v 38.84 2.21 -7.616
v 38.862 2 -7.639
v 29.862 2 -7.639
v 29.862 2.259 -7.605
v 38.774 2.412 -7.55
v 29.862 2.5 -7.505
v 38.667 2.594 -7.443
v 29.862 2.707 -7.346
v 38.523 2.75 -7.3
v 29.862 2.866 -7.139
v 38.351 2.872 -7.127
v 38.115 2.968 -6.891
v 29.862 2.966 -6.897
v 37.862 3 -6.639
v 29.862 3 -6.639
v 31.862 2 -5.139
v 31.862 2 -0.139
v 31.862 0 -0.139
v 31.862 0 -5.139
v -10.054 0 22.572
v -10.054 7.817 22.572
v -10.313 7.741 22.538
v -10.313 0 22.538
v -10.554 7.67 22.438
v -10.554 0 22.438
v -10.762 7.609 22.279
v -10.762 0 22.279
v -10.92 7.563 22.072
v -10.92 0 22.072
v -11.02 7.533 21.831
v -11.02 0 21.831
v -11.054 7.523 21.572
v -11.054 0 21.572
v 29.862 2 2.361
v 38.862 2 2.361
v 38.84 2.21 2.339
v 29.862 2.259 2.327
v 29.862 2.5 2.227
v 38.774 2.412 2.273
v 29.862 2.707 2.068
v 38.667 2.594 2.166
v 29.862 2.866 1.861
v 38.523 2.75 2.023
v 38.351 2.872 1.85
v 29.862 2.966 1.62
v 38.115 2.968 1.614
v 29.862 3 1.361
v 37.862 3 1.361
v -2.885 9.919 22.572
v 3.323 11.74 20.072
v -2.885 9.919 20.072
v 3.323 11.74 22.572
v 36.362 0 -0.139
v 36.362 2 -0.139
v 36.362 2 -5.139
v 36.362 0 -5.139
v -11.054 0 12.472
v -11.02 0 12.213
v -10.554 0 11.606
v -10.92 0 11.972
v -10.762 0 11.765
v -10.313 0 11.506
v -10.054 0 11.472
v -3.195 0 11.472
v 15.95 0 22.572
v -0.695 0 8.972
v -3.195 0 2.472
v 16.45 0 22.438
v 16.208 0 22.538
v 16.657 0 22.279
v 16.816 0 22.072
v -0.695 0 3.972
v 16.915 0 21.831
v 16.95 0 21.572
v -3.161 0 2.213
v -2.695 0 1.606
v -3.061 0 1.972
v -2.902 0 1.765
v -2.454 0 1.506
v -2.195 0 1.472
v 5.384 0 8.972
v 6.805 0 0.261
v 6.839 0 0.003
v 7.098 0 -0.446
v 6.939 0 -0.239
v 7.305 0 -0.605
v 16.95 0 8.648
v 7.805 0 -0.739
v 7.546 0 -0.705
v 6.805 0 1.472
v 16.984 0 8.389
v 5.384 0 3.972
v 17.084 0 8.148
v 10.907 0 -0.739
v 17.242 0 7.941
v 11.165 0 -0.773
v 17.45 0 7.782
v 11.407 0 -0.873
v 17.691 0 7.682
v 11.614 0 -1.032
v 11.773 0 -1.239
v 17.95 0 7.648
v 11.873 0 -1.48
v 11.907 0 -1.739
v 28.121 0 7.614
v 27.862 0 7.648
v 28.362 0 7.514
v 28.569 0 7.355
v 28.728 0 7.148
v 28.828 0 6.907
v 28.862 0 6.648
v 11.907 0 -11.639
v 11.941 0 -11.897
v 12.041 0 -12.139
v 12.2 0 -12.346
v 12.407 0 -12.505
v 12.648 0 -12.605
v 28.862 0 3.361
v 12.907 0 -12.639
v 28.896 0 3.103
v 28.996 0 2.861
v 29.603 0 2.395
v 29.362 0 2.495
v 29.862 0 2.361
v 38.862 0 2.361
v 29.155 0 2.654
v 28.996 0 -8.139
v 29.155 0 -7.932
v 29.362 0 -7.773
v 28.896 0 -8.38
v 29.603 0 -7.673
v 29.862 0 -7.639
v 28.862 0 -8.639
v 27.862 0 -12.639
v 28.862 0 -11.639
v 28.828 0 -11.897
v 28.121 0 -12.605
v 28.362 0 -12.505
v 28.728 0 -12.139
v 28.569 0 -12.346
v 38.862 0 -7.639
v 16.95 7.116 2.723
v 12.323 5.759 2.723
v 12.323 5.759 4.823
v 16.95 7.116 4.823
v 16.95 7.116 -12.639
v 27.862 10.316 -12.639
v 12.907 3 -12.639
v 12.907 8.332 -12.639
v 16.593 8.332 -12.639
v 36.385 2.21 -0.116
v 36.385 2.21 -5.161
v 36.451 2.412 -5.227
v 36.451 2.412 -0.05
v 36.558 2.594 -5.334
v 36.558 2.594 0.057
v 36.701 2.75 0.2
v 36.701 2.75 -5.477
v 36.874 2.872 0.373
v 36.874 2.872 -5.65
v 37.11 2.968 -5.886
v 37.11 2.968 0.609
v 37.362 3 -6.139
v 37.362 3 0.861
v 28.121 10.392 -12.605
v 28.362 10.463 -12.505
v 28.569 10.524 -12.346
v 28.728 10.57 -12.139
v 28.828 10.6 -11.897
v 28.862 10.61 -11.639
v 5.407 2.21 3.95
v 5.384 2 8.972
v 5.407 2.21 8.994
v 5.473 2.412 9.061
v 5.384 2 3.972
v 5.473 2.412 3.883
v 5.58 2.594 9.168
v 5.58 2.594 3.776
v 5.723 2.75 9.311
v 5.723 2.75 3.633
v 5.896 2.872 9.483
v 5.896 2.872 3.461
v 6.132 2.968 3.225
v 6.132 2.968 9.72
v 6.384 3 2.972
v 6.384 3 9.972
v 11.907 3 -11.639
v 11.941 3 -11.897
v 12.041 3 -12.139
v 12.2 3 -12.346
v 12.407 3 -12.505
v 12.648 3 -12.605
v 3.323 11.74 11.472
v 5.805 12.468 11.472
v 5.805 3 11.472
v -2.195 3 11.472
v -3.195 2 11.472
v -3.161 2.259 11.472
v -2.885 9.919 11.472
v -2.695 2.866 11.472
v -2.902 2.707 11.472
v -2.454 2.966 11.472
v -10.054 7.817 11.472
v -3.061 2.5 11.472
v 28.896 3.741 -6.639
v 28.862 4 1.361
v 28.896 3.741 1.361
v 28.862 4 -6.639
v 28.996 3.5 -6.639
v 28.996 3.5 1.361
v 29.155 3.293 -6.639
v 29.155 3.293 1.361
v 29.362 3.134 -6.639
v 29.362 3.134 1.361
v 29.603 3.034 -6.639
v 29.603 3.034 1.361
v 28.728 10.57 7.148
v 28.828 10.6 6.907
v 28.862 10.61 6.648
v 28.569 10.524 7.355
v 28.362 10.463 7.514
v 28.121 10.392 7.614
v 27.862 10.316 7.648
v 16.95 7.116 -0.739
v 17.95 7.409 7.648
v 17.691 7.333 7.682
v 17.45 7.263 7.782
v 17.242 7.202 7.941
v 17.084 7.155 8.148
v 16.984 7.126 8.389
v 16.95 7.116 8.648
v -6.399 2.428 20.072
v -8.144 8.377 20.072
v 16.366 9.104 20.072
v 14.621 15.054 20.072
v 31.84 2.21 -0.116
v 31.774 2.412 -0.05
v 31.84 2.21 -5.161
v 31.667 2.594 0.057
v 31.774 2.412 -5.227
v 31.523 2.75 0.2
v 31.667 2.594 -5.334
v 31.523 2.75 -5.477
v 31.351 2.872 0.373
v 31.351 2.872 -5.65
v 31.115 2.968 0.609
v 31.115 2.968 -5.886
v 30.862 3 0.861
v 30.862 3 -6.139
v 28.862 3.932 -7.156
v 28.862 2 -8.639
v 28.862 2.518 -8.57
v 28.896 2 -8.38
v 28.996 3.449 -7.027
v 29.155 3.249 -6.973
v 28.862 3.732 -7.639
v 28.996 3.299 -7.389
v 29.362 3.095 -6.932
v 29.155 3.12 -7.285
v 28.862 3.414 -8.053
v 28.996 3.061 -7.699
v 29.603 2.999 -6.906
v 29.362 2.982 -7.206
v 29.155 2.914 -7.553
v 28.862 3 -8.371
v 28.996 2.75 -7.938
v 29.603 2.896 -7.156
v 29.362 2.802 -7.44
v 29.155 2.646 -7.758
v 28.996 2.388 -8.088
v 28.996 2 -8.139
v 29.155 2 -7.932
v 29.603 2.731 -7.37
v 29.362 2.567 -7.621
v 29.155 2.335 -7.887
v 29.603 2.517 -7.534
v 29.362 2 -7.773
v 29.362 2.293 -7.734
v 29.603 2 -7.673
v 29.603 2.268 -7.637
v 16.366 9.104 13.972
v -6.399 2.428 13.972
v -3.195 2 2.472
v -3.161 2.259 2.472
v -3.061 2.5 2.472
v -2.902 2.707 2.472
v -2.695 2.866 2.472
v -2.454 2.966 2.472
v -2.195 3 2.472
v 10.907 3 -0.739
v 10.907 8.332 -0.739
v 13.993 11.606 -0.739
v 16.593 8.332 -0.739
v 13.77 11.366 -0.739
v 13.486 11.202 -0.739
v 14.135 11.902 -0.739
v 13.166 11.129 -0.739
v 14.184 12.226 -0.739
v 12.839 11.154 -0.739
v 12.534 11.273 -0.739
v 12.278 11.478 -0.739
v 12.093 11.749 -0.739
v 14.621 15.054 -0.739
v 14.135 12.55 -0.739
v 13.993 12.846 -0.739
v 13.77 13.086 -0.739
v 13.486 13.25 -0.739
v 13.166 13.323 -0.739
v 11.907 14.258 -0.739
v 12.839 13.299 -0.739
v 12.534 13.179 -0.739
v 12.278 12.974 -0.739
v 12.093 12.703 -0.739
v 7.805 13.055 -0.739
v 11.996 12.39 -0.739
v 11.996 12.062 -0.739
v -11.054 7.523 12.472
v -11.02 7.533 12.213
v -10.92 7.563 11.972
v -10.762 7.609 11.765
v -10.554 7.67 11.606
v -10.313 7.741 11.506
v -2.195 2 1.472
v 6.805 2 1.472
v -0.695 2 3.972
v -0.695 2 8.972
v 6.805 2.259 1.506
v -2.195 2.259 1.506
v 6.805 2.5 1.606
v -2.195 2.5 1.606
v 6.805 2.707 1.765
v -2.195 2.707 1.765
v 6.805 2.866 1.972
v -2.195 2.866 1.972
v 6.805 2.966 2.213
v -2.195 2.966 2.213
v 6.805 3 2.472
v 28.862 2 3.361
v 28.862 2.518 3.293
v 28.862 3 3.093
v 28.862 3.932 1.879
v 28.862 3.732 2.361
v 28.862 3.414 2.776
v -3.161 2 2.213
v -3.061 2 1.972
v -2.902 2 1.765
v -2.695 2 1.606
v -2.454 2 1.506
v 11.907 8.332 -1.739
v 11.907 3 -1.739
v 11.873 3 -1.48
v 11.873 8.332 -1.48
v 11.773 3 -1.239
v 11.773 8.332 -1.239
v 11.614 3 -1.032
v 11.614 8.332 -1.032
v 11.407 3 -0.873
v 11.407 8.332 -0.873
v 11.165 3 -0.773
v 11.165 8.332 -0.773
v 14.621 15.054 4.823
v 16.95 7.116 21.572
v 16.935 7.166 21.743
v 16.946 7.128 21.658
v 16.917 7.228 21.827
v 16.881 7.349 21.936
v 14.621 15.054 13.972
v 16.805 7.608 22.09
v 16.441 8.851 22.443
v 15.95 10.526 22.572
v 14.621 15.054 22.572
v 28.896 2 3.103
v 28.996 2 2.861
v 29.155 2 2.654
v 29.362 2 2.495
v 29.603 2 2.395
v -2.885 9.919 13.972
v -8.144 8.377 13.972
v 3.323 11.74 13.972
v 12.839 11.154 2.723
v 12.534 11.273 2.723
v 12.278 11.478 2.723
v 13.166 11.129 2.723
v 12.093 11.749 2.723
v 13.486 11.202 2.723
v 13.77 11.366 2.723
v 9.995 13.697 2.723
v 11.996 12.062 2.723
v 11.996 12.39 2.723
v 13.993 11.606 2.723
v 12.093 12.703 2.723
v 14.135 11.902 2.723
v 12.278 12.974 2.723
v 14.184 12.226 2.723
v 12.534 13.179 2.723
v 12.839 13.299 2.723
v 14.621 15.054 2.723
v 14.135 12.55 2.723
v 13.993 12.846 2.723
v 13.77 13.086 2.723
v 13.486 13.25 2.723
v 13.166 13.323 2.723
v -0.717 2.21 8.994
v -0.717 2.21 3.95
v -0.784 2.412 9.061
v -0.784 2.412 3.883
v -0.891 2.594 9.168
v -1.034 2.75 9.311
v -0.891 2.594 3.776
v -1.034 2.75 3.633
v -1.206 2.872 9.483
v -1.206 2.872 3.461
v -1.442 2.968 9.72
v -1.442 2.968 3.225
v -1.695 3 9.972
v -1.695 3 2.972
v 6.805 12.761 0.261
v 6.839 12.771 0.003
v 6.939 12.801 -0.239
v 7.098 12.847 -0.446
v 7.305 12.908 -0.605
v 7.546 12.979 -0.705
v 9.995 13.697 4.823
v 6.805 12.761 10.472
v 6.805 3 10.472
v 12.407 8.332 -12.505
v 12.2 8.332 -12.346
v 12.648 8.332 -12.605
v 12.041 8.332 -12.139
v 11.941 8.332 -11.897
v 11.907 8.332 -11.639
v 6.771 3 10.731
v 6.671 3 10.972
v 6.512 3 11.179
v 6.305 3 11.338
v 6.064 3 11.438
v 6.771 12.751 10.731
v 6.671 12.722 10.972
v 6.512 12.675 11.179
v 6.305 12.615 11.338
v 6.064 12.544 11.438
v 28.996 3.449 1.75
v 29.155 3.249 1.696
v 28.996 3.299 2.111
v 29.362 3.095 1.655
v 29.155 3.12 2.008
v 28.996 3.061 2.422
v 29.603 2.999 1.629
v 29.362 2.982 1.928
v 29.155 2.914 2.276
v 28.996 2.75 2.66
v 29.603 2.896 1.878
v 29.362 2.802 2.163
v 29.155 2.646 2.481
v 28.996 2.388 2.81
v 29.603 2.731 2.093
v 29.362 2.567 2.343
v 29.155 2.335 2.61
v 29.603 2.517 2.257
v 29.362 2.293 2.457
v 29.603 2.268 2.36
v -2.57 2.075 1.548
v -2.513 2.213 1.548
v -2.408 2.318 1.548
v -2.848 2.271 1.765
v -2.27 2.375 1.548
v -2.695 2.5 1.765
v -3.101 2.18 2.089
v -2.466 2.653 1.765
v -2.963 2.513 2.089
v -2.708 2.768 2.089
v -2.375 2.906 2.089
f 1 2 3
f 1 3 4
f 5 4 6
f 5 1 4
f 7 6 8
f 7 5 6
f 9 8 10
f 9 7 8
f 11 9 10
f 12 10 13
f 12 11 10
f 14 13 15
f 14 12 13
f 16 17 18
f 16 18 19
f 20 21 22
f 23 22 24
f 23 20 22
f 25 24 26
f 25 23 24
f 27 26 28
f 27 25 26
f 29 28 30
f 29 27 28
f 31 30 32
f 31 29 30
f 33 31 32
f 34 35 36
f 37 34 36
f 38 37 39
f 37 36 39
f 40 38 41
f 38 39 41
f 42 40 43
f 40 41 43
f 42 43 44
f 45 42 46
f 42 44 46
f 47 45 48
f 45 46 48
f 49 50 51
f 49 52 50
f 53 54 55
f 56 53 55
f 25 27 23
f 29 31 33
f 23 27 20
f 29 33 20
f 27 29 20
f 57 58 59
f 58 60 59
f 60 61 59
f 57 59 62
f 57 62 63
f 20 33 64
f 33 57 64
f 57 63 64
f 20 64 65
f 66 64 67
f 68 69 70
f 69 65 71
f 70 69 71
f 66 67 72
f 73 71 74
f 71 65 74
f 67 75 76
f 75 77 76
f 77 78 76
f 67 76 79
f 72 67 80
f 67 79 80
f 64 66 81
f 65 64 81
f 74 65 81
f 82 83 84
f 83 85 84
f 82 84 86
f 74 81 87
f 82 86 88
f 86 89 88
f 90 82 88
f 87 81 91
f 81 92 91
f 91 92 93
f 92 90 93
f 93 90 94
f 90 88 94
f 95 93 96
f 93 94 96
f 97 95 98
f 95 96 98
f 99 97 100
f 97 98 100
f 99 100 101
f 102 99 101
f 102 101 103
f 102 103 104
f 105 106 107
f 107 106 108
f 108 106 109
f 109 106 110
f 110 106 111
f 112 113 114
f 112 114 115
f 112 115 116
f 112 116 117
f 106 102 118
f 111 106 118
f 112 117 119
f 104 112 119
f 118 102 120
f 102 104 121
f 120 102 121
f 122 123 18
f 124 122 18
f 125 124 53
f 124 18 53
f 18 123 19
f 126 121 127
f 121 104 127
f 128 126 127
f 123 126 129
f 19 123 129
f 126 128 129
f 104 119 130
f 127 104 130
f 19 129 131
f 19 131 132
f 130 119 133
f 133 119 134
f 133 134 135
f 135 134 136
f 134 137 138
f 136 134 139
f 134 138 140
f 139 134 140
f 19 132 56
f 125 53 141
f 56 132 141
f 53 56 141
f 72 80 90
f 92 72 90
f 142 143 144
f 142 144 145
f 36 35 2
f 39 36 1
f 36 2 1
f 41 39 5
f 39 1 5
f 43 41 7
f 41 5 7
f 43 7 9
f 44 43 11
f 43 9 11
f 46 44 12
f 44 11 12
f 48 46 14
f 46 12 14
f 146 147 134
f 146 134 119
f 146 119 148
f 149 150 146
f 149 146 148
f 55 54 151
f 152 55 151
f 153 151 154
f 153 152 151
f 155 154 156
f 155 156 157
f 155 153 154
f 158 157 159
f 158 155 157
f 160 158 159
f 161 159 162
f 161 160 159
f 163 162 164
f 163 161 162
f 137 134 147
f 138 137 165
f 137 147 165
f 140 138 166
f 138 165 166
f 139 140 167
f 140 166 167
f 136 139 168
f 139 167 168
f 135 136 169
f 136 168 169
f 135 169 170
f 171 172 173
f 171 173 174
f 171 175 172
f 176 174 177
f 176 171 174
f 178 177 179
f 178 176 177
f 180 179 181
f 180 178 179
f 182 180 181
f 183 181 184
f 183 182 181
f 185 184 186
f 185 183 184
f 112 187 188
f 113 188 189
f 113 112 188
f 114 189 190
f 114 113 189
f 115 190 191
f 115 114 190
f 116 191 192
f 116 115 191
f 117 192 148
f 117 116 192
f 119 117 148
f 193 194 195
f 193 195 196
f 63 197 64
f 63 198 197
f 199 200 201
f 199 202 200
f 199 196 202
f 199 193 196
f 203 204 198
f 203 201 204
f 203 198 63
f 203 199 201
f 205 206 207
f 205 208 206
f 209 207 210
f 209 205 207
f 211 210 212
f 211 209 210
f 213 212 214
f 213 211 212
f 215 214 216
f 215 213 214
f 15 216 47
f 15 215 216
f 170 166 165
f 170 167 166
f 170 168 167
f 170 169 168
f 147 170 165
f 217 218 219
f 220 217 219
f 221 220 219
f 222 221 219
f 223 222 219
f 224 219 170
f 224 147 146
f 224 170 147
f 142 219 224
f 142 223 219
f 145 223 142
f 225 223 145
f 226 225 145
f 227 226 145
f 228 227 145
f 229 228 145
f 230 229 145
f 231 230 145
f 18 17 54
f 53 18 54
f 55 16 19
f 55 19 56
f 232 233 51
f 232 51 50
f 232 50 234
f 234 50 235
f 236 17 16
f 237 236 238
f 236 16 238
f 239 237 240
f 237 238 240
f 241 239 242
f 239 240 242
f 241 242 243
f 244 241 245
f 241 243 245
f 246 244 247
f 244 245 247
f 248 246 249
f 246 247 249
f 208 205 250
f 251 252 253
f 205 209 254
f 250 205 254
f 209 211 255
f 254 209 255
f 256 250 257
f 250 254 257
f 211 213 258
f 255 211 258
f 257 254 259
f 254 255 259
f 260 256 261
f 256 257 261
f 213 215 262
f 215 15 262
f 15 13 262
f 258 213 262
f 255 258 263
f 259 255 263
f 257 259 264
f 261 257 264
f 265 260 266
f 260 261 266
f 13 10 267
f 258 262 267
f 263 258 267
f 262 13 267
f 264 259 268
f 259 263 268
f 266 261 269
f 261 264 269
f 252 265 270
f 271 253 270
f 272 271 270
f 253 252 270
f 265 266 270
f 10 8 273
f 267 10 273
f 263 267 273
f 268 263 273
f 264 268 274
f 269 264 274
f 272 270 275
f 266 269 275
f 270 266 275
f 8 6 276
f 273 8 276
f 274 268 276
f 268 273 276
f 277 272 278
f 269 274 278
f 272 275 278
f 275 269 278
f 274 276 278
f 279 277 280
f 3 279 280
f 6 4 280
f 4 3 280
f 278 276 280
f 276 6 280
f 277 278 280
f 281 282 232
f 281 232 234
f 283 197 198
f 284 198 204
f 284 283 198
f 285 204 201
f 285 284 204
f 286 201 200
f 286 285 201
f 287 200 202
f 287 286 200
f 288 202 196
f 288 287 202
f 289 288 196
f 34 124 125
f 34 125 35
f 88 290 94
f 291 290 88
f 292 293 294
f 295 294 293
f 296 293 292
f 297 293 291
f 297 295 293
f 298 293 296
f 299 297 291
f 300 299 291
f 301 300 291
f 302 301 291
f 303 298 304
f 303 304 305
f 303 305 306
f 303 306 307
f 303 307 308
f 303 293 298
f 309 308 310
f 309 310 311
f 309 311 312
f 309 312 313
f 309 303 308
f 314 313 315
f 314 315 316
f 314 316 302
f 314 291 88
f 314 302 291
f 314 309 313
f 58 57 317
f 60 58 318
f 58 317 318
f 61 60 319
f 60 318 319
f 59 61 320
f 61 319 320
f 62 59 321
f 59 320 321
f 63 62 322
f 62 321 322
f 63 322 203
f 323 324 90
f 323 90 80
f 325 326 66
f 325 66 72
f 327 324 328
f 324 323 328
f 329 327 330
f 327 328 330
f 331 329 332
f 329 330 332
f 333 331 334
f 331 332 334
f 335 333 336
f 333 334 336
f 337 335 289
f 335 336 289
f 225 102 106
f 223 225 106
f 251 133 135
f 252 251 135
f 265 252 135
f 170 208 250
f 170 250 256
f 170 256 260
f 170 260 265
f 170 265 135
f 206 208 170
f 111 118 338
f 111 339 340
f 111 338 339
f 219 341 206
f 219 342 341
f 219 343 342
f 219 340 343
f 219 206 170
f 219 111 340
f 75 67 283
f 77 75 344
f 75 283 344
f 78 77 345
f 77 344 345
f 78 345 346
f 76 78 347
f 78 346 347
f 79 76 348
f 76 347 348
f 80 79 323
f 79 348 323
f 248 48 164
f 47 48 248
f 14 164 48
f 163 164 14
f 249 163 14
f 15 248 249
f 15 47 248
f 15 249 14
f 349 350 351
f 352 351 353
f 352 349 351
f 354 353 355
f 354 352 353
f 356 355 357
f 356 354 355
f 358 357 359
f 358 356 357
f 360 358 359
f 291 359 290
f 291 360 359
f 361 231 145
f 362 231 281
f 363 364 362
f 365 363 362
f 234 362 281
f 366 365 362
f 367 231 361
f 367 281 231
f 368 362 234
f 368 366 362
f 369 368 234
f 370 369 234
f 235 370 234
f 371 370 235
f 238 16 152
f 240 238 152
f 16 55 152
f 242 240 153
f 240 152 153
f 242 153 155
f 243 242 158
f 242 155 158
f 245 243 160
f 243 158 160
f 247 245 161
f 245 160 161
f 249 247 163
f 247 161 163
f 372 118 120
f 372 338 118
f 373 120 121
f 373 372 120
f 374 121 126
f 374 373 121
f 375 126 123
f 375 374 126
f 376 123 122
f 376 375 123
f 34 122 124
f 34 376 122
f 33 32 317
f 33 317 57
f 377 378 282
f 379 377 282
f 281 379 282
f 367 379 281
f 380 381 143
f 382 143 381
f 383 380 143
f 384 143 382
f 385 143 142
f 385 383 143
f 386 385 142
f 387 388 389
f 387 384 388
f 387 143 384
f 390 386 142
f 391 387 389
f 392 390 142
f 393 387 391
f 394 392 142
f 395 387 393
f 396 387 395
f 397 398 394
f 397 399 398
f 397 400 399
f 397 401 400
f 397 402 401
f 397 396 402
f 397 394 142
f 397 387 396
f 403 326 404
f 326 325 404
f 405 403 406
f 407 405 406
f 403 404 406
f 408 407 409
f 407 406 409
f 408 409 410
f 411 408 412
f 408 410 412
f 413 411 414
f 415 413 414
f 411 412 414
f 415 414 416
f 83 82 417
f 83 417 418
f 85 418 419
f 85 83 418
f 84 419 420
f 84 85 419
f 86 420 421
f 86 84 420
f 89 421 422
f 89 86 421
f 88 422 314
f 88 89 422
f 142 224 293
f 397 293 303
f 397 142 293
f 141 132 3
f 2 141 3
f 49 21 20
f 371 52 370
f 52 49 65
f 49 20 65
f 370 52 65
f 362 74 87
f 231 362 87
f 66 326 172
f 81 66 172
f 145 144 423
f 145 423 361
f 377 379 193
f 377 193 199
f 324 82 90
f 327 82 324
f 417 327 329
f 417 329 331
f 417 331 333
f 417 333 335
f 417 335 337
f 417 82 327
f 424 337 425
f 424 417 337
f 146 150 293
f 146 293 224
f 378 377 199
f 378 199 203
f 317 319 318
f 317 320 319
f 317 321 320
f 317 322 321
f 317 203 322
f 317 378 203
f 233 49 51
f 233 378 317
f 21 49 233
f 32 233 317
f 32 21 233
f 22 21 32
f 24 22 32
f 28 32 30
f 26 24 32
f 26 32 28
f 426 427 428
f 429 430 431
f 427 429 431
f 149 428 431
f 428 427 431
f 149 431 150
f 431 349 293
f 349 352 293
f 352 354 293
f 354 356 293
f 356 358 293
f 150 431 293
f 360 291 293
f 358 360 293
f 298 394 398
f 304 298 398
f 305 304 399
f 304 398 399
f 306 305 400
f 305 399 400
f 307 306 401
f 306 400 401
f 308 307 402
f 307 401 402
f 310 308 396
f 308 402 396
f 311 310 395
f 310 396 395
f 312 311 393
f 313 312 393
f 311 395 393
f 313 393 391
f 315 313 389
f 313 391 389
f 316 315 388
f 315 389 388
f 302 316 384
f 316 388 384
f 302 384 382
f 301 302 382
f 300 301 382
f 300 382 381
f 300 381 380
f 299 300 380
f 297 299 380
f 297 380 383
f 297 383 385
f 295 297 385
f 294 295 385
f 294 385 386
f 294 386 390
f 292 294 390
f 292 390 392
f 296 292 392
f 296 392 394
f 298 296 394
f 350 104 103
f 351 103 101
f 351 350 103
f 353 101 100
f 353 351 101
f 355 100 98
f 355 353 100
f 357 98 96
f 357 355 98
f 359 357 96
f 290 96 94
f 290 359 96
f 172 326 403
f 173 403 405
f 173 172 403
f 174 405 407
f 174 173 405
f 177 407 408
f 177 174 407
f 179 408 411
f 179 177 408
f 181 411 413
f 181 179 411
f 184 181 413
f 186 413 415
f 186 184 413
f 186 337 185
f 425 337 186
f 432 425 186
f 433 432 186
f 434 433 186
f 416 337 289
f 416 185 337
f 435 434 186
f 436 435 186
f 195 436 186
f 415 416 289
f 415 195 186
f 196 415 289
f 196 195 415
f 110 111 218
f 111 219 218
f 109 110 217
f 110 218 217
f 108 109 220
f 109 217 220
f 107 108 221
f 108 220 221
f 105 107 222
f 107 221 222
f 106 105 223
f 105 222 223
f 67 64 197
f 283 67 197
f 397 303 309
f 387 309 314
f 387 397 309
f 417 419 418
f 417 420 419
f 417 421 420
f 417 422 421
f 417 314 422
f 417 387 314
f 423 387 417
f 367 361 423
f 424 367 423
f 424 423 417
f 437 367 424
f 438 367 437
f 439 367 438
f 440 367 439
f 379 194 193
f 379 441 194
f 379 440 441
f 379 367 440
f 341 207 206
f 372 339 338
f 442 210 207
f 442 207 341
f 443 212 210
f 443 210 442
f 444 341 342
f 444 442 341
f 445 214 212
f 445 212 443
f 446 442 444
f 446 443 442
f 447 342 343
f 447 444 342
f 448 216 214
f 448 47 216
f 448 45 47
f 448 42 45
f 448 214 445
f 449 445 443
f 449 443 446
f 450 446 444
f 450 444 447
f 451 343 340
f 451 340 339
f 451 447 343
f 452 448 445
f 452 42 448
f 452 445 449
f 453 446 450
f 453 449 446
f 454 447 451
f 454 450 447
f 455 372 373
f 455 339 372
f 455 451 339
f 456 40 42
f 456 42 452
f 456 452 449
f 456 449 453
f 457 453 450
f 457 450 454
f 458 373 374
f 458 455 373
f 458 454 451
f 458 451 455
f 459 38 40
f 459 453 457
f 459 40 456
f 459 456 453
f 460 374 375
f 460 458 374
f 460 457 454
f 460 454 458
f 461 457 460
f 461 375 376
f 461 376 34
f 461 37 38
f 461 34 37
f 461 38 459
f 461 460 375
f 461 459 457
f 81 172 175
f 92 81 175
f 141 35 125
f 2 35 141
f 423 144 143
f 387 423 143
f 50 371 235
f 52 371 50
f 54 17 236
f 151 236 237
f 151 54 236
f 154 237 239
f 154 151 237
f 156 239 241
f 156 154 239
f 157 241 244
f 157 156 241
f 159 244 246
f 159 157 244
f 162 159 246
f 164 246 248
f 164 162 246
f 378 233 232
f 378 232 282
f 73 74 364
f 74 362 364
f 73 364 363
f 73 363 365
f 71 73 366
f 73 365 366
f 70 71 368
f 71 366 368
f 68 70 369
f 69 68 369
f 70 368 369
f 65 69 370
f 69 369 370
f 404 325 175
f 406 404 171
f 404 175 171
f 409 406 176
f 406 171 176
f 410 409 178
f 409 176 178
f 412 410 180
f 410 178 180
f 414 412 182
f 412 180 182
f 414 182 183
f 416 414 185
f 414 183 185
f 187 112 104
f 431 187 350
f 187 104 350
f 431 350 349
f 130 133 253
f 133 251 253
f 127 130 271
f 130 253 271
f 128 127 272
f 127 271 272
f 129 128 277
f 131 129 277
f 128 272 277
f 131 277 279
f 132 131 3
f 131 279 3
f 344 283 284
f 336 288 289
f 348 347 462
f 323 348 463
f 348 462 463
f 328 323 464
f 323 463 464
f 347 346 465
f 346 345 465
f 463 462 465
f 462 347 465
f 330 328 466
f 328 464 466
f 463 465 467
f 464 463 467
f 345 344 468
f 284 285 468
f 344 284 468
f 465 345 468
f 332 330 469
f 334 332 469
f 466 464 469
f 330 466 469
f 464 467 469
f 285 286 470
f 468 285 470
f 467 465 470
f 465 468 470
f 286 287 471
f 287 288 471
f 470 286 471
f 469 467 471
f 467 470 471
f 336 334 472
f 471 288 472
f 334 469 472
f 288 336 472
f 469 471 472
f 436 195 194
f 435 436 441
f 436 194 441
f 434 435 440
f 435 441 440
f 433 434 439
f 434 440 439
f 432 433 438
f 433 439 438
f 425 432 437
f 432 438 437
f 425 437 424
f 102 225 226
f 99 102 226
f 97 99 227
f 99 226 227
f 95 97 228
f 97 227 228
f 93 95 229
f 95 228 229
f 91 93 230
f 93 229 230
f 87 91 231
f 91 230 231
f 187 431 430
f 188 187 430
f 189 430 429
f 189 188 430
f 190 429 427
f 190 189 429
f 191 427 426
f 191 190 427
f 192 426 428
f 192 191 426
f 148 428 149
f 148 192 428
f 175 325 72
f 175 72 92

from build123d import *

# Parameters (mm, degrees)
SKETCH2_W                       = 43.976301399
SKETCH2_H                       = 37.406376753
BOSS_EXTRUDE1_DEPTH             = 3
BOSS_EXTRUDE2_REACH             = 40.151
BOSS_EXTRUDE2_DIRECTION_2_REACH = 40.151
SKETCH4_W                       = 23.72463769
SKETCH4_H                       = 6.1
CUT_EXTRUDE1_DEPTH              = 6.2
SKETCH5_W                       = 13.436339427
SKETCH5_H                       = 17.119562917
CUT_EXTRUDE2_DEPTH              = 42.11242086
CUT_EXTRUDE3_DEPTH              = 40.896849069
CUT_EXTRUDE3_DEPTH_BACK         = 40.896849069
SKETCH6_W                       = 32.063710036
SKETCH6_H                       = 2.195719192
SKETCH7_W                       = 17.859472784
SKETCH7_H                       = 24.110657561
CUT_EXTRUDE4_DEPTH              = 39.572188243
SKETCH9_W                       = 5.100000004
SKETCH9_H                       = 2.100000005
CUT_EXTRUDE5_DEPTH              = 8.272220174
SKETCH10_W                      = 4.059731886
SKETCH10_H                      = 35.210657561
CUT_EXTRUDE6_DEPTH              = 39.572188243
CUT_EXTRUDE7_DEPTH              = 11.9
SKETCH14_W                      = 10
SKETCH14_H                      = 3
BOSS_EXTRUDE3_DEPTH             = 10
SKETCH15_W                      = 4.5
SKETCH15_H                      = 5
CUT_EXTRUDE8_DEPTH              = 47.530169979
FILLET1_R                       = 1
CUT_EXTRUDE9_DEPTH              = 49.140668642
CUT_EXTRUDE10_DEPTH             = 11.9
SKETCH19_R                      = 1.1
CUT_EXTRUDE11_DEPTH             = 47.161274086
BOSS_EXTRUDE4_DEPTH             = 11.9
FILLET2_R                       = 1
SKETCH22_W                      = 10
SKETCH22_H                      = 3
BOSS_EXTRUDE5_DEPTH             = 10
SKETCH23_W                      = 6.079403202
SKETCH23_H                      = 5
CUT_EXTRUDE12_DEPTH             = 47.530169979
FILLET4_R                       = 1


with BuildPart() as part:
    # Sketch2 → Boss-Extrude1 (new body)
    with BuildSketch(Plane(origin=(0, 0, 0), x_dir=(1, 0, 0), z_dir=(0, 1, 0))):
        with Locations((6.873999922, -6.064560357)):
            Rectangle(SKETCH2_W, SKETCH2_H)
    extrude(amount=BOSS_EXTRUDE1_DEPTH)

    # Boss-Extrude2: up to this face of the body (flat: up to its plane)
    boss_extrude2_end = Plane(part.part.faces().sort_by_distance((6.873999922, 1.5, 24.767748733))[0])
    # Sketch3 → Boss-Extrude2 (add, up to the picked face)
    with BuildSketch(Plane.XY, mode=Mode.PRIVATE) as boss_extrude2_sk1:
        Polygon((3.322651848, 11.739980321), (-2.884556794, 9.919492418), (-11.054418892, 7.523385572), (-11.054418892, 3), (28.862150621, 3), (28.862150621, 10.609703324), (16.949559258, 7.115906075), (14.621493291, 15.05377326), align=None)
    boss_extrude2_tool1 = split(extrude(boss_extrude2_sk1.sketch, amount=BOSS_EXTRUDE2_REACH, mode=Mode.PRIVATE), bisect_by=boss_extrude2_end, keep=Keep.BOTH, mode=Mode.PRIVATE)
    add(boss_extrude2_tool1.solids().sort_by(Axis((9.048322, 7.098551, 0), (0, 0, 1)))[0])

    # Boss-Extrude2 direction 2: up to this face of the body (flat: up to its plane)
    boss_extrude2_direction_2_end = Plane(part.part.faces().sort_by_distance((6.873999922, 1.5, -12.63862802))[0])
    # Sketch3 → Boss-Extrude2 direction 2 (add, up to the picked face)
    with BuildSketch(Plane.XY, mode=Mode.PRIVATE) as boss_extrude2_direction_2_sk1:
        Polygon((3.322651848, 11.739980321), (-2.884556794, 9.919492418), (-11.054418892, 7.523385572), (-11.054418892, 3), (28.862150621, 3), (28.862150621, 10.609703324), (16.949559258, 7.115906075), (14.621493291, 15.05377326), align=None)
    boss_extrude2_direction_2_tool1 = split(extrude(boss_extrude2_direction_2_sk1.sketch, amount=-BOSS_EXTRUDE2_DIRECTION_2_REACH, mode=Mode.PRIVATE), bisect_by=boss_extrude2_direction_2_end, keep=Keep.BOTH, mode=Mode.PRIVATE)
    add(boss_extrude2_direction_2_tool1.solids().sort_by(Axis((9.048322, 7.098551, 0), (0, 0, -1)))[0])

    # Sketch4 → Cut-Extrude1 (cut)
    with BuildSketch(Plane(origin=(-2.907293344, 9.912824104, 0), x_dir=(0.9595812271500734, 0.2814318185656328, 0), z_dir=(-0.2814318185656328, 0.9595812271500734, 0))):
        with Locations((6.404802415, -17.022029541)):
            Rectangle(SKETCH4_W, SKETCH4_H)
    extrude(amount=-CUT_EXTRUDE1_DEPTH, mode=Mode.SUBTRACT)

    # Sketch5 → Cut-Extrude2 (cut, through all)
    with BuildSketch(Plane(origin=(-0.295587327, 0, 0), x_dir=(1, 0, 0), z_dir=(0, 1, 0))):
        with Locations((23.963316299, -16.207967274)):
            Rectangle(SKETCH5_W, SKETCH5_H)
    extrude(amount=CUT_EXTRUDE2_DEPTH, mode=Mode.SUBTRACT)

    # Sketch6 → Cut-Extrude3 (cut, two sides: drawn at the far end of the back side and taken through both)
    with BuildSketch(Plane(origin=(0, 3, 0), x_dir=(1, 0, 0), z_dir=(0, 1, 0)).offset(-CUT_EXTRUDE3_DEPTH_BACK)):
        with Locations((0.91770424, -23.669889137)):
            Rectangle(SKETCH6_W, SKETCH6_H)
    extrude(amount=CUT_EXTRUDE3_DEPTH + CUT_EXTRUDE3_DEPTH_BACK, mode=Mode.SUBTRACT)

    # Sketch7 → Cut-Extrude4 (cut, through all)
    with BuildSketch(Plane(origin=(0, 3, 0), x_dir=(1, 0, 0), z_dir=(0, 1, 0))):
        with Locations((-2.1246825, 0.583299239)):
            Rectangle(SKETCH7_W, SKETCH7_H)
    extrude(amount=CUT_EXTRUDE4_DEPTH, mode=Mode.SUBTRACT)

    # Sketch9 → Cut-Extrude5 (cut)
    with BuildSketch(Plane(origin=(-2.907293344, 9.912824104, 0), x_dir=(0.9595812271500733, 0.28143181856563293, 0), z_dir=(-0.28143181856563293, 0.9595812271500733, 0))):
        with Locations((15.995967709, -3.773090404)):
            Rectangle(SKETCH9_W, SKETCH9_H)
    extrude(amount=-CUT_EXTRUDE5_DEPTH, mode=Mode.SUBTRACT)

    # Sketch10 → Cut-Extrude6 (cut, through all)
    with BuildSketch(Plane(origin=(0, 3, 0), x_dir=(1, 0, 0), z_dir=(0, 1, 0))):
        with Locations((-13.084284835, -4.966700761)):
            Rectangle(SKETCH10_W, SKETCH10_H)
    extrude(amount=-CUT_EXTRUDE6_DEPTH, mode=Mode.SUBTRACT)

    # Sketch11 → Cut-Extrude7 (cut)
    with BuildSketch(Plane(origin=(0, 0, -12.63862802), x_dir=(-1, 0, 0), z_dir=(0, 0, -1))):
        Polygon((-6.805053892, 3), (-11.906625133, 3), (-11.906625133, 14.257540215), (-6.805053892, 12.761320373), align=None)
    extrude(amount=-CUT_EXTRUDE7_DEPTH, mode=Mode.SUBTRACT)

    # Sketch14 → Boss-Extrude3 (add)
    with BuildSketch(Plane(origin=(28.862150621, 0, 0), x_dir=(0, 0, -1), z_dir=(1, 0, 0))):
        with Locations((2.63862802, 1.5)):
            Rectangle(SKETCH14_W, SKETCH14_H)
    extrude(amount=BOSS_EXTRUDE3_DEPTH)

    # Sketch15 → Cut-Extrude8 (cut, through all)
    with BuildSketch(Plane(origin=(0, 3, 0), x_dir=(1, 0, 0), z_dir=(0, 1, 0))):
        with Locations((34.112150621, 2.63862802)):
            Rectangle(SKETCH15_W, SKETCH15_H)
    extrude(amount=-CUT_EXTRUDE8_DEPTH, mode=Mode.SUBTRACT)

    # Fillet1
    fillet1_edges = [part.edges().sort_by_distance(p)[0] for p in [
        (28.862150621, 1.5, -7.63862802),
        (28.862150621, 1.5, 2.36137198),
        (33.862150621, 3, -7.63862802),
        (38.862150621, 3, -2.63862802),
        (33.862150621, 3, 2.36137198),
        (28.862150621, 3, -2.63862802),
        (36.362150621, 3, -2.63862802),
        (34.112150621, 3, -5.13862802),
        (31.862150621, 3, -2.63862802),
        (34.112150621, 3, -0.13862802),
    ]]
    fillet(fillet1_edges, radius=FILLET1_R)

    # Sketch17 → Cut-Extrude9 (cut, through all)
    with BuildSketch(Plane(origin=(-1.914484966, 3, 0), x_dir=(1, 0, 0), z_dir=(0, 1, 0))):
        Polygon((13.8211101, 12.63862802), (13.8211101, 0.73862802), (8.719538859, 0.73862802), (8.719538859, -11.472029541), (-9.139933926, -11.472029541), (-9.139933926, 12.63862802), align=None)
    extrude(amount=-CUT_EXTRUDE9_DEPTH, mode=Mode.SUBTRACT)

    # Sketch18 → Cut-Extrude10 (cut)
    with BuildSketch(Plane(origin=(0, 0, -12.63862802), x_dir=(-1, 0, 0), z_dir=(0, 0, -1))):
        Polygon((-16.949559258, 7.115906075), (-11.906625133, 5.636883683), (-11.906625133, 14.257540215), (-14.621493291, 15.05377326), align=None)
    extrude(amount=-CUT_EXTRUDE10_DEPTH, mode=Mode.SUBTRACT)

    # Sketch19 → Cut-Extrude11 (cut, through all)
    with BuildSketch(Plane.XY.offset(2.723090401)):
        with Locations((13.083993021, 12.226100253)):
            Circle(SKETCH19_R)
    extrude(amount=-CUT_EXTRUDE11_DEPTH, mode=Mode.SUBTRACT)

    # Sketch21 → Boss-Extrude4 (add)
    with BuildSketch(Plane(origin=(0, 0, -0.73862802), x_dir=(-1, 0, 0), z_dir=(0, 0, -1))):
        Polygon((-16.949559258, 7.115906075), (-11.906625133, 5.636883683), (-11.906625133, 8.331943724), (-16.592912341, 8.331943724), align=None)
    extrude(amount=BOSS_EXTRUDE4_DEPTH)

    # Fillet2
    fillet2_edges = [part.edges().sort_by_distance(p)[0] for p in [
        (16.949559258, 3.557953038, 7.648185816),
        (16.949559258, 3.557953038, 22.572029541),
        (28.862150621, 5.304851662, 7.648185816),
        (28.862150621, 5.304851662, -12.63862802),
        (11.906625133, 4.165971862, -0.73862802),
        (11.906625133, 4.165971862, -12.63862802),
        (-11.054418892, 3.761692786, 11.472029541),
        (-11.054418892, 3.761692786, 22.572029541),
        (6.805053892, 6.380660187, -0.73862802),
        (6.805053892, 6.380660187, 11.472029541),
    ]]
    fillet(fillet2_edges, radius=FILLET2_R)

    # Sketch22 → Boss-Extrude5 (add)
    with BuildSketch(Plane(origin=(0, 0, 11.472029541), x_dir=(-1, 0, 0), z_dir=(0, 0, -1))):
        with Locations((-1.805053892, 1.5)):
            Rectangle(SKETCH22_W, SKETCH22_H)
    extrude(amount=BOSS_EXTRUDE5_DEPTH)

    # Sketch23 → Cut-Extrude12 (cut, through all)
    with BuildSketch(Plane(origin=(0, 3, 0), x_dir=(1, 0, 0), z_dir=(0, 1, 0))):
        with Locations((2.344755493, -6.472029541)):
            Rectangle(SKETCH23_W, SKETCH23_H)
    extrude(amount=-CUT_EXTRUDE12_DEPTH, mode=Mode.SUBTRACT)

    # Fillet4
    fillet4_edges = [part.edges().sort_by_distance(p)[0] for p in [
        (-3.194946108, 3, 6.472029541),
        (-3.194946108, 1.5, 1.472029541),
        (1.805053892, 3, 1.472029541),
        (5.384457094, 3, 6.472029541),
        (2.344755493, 3, 3.972029541),
        (-0.694946108, 3, 6.472029541),
        (2.344755493, 3, 8.972029541),
    ]]
    fillet(fillet4_edges, radius=FILLET4_R)


solid = part.part
